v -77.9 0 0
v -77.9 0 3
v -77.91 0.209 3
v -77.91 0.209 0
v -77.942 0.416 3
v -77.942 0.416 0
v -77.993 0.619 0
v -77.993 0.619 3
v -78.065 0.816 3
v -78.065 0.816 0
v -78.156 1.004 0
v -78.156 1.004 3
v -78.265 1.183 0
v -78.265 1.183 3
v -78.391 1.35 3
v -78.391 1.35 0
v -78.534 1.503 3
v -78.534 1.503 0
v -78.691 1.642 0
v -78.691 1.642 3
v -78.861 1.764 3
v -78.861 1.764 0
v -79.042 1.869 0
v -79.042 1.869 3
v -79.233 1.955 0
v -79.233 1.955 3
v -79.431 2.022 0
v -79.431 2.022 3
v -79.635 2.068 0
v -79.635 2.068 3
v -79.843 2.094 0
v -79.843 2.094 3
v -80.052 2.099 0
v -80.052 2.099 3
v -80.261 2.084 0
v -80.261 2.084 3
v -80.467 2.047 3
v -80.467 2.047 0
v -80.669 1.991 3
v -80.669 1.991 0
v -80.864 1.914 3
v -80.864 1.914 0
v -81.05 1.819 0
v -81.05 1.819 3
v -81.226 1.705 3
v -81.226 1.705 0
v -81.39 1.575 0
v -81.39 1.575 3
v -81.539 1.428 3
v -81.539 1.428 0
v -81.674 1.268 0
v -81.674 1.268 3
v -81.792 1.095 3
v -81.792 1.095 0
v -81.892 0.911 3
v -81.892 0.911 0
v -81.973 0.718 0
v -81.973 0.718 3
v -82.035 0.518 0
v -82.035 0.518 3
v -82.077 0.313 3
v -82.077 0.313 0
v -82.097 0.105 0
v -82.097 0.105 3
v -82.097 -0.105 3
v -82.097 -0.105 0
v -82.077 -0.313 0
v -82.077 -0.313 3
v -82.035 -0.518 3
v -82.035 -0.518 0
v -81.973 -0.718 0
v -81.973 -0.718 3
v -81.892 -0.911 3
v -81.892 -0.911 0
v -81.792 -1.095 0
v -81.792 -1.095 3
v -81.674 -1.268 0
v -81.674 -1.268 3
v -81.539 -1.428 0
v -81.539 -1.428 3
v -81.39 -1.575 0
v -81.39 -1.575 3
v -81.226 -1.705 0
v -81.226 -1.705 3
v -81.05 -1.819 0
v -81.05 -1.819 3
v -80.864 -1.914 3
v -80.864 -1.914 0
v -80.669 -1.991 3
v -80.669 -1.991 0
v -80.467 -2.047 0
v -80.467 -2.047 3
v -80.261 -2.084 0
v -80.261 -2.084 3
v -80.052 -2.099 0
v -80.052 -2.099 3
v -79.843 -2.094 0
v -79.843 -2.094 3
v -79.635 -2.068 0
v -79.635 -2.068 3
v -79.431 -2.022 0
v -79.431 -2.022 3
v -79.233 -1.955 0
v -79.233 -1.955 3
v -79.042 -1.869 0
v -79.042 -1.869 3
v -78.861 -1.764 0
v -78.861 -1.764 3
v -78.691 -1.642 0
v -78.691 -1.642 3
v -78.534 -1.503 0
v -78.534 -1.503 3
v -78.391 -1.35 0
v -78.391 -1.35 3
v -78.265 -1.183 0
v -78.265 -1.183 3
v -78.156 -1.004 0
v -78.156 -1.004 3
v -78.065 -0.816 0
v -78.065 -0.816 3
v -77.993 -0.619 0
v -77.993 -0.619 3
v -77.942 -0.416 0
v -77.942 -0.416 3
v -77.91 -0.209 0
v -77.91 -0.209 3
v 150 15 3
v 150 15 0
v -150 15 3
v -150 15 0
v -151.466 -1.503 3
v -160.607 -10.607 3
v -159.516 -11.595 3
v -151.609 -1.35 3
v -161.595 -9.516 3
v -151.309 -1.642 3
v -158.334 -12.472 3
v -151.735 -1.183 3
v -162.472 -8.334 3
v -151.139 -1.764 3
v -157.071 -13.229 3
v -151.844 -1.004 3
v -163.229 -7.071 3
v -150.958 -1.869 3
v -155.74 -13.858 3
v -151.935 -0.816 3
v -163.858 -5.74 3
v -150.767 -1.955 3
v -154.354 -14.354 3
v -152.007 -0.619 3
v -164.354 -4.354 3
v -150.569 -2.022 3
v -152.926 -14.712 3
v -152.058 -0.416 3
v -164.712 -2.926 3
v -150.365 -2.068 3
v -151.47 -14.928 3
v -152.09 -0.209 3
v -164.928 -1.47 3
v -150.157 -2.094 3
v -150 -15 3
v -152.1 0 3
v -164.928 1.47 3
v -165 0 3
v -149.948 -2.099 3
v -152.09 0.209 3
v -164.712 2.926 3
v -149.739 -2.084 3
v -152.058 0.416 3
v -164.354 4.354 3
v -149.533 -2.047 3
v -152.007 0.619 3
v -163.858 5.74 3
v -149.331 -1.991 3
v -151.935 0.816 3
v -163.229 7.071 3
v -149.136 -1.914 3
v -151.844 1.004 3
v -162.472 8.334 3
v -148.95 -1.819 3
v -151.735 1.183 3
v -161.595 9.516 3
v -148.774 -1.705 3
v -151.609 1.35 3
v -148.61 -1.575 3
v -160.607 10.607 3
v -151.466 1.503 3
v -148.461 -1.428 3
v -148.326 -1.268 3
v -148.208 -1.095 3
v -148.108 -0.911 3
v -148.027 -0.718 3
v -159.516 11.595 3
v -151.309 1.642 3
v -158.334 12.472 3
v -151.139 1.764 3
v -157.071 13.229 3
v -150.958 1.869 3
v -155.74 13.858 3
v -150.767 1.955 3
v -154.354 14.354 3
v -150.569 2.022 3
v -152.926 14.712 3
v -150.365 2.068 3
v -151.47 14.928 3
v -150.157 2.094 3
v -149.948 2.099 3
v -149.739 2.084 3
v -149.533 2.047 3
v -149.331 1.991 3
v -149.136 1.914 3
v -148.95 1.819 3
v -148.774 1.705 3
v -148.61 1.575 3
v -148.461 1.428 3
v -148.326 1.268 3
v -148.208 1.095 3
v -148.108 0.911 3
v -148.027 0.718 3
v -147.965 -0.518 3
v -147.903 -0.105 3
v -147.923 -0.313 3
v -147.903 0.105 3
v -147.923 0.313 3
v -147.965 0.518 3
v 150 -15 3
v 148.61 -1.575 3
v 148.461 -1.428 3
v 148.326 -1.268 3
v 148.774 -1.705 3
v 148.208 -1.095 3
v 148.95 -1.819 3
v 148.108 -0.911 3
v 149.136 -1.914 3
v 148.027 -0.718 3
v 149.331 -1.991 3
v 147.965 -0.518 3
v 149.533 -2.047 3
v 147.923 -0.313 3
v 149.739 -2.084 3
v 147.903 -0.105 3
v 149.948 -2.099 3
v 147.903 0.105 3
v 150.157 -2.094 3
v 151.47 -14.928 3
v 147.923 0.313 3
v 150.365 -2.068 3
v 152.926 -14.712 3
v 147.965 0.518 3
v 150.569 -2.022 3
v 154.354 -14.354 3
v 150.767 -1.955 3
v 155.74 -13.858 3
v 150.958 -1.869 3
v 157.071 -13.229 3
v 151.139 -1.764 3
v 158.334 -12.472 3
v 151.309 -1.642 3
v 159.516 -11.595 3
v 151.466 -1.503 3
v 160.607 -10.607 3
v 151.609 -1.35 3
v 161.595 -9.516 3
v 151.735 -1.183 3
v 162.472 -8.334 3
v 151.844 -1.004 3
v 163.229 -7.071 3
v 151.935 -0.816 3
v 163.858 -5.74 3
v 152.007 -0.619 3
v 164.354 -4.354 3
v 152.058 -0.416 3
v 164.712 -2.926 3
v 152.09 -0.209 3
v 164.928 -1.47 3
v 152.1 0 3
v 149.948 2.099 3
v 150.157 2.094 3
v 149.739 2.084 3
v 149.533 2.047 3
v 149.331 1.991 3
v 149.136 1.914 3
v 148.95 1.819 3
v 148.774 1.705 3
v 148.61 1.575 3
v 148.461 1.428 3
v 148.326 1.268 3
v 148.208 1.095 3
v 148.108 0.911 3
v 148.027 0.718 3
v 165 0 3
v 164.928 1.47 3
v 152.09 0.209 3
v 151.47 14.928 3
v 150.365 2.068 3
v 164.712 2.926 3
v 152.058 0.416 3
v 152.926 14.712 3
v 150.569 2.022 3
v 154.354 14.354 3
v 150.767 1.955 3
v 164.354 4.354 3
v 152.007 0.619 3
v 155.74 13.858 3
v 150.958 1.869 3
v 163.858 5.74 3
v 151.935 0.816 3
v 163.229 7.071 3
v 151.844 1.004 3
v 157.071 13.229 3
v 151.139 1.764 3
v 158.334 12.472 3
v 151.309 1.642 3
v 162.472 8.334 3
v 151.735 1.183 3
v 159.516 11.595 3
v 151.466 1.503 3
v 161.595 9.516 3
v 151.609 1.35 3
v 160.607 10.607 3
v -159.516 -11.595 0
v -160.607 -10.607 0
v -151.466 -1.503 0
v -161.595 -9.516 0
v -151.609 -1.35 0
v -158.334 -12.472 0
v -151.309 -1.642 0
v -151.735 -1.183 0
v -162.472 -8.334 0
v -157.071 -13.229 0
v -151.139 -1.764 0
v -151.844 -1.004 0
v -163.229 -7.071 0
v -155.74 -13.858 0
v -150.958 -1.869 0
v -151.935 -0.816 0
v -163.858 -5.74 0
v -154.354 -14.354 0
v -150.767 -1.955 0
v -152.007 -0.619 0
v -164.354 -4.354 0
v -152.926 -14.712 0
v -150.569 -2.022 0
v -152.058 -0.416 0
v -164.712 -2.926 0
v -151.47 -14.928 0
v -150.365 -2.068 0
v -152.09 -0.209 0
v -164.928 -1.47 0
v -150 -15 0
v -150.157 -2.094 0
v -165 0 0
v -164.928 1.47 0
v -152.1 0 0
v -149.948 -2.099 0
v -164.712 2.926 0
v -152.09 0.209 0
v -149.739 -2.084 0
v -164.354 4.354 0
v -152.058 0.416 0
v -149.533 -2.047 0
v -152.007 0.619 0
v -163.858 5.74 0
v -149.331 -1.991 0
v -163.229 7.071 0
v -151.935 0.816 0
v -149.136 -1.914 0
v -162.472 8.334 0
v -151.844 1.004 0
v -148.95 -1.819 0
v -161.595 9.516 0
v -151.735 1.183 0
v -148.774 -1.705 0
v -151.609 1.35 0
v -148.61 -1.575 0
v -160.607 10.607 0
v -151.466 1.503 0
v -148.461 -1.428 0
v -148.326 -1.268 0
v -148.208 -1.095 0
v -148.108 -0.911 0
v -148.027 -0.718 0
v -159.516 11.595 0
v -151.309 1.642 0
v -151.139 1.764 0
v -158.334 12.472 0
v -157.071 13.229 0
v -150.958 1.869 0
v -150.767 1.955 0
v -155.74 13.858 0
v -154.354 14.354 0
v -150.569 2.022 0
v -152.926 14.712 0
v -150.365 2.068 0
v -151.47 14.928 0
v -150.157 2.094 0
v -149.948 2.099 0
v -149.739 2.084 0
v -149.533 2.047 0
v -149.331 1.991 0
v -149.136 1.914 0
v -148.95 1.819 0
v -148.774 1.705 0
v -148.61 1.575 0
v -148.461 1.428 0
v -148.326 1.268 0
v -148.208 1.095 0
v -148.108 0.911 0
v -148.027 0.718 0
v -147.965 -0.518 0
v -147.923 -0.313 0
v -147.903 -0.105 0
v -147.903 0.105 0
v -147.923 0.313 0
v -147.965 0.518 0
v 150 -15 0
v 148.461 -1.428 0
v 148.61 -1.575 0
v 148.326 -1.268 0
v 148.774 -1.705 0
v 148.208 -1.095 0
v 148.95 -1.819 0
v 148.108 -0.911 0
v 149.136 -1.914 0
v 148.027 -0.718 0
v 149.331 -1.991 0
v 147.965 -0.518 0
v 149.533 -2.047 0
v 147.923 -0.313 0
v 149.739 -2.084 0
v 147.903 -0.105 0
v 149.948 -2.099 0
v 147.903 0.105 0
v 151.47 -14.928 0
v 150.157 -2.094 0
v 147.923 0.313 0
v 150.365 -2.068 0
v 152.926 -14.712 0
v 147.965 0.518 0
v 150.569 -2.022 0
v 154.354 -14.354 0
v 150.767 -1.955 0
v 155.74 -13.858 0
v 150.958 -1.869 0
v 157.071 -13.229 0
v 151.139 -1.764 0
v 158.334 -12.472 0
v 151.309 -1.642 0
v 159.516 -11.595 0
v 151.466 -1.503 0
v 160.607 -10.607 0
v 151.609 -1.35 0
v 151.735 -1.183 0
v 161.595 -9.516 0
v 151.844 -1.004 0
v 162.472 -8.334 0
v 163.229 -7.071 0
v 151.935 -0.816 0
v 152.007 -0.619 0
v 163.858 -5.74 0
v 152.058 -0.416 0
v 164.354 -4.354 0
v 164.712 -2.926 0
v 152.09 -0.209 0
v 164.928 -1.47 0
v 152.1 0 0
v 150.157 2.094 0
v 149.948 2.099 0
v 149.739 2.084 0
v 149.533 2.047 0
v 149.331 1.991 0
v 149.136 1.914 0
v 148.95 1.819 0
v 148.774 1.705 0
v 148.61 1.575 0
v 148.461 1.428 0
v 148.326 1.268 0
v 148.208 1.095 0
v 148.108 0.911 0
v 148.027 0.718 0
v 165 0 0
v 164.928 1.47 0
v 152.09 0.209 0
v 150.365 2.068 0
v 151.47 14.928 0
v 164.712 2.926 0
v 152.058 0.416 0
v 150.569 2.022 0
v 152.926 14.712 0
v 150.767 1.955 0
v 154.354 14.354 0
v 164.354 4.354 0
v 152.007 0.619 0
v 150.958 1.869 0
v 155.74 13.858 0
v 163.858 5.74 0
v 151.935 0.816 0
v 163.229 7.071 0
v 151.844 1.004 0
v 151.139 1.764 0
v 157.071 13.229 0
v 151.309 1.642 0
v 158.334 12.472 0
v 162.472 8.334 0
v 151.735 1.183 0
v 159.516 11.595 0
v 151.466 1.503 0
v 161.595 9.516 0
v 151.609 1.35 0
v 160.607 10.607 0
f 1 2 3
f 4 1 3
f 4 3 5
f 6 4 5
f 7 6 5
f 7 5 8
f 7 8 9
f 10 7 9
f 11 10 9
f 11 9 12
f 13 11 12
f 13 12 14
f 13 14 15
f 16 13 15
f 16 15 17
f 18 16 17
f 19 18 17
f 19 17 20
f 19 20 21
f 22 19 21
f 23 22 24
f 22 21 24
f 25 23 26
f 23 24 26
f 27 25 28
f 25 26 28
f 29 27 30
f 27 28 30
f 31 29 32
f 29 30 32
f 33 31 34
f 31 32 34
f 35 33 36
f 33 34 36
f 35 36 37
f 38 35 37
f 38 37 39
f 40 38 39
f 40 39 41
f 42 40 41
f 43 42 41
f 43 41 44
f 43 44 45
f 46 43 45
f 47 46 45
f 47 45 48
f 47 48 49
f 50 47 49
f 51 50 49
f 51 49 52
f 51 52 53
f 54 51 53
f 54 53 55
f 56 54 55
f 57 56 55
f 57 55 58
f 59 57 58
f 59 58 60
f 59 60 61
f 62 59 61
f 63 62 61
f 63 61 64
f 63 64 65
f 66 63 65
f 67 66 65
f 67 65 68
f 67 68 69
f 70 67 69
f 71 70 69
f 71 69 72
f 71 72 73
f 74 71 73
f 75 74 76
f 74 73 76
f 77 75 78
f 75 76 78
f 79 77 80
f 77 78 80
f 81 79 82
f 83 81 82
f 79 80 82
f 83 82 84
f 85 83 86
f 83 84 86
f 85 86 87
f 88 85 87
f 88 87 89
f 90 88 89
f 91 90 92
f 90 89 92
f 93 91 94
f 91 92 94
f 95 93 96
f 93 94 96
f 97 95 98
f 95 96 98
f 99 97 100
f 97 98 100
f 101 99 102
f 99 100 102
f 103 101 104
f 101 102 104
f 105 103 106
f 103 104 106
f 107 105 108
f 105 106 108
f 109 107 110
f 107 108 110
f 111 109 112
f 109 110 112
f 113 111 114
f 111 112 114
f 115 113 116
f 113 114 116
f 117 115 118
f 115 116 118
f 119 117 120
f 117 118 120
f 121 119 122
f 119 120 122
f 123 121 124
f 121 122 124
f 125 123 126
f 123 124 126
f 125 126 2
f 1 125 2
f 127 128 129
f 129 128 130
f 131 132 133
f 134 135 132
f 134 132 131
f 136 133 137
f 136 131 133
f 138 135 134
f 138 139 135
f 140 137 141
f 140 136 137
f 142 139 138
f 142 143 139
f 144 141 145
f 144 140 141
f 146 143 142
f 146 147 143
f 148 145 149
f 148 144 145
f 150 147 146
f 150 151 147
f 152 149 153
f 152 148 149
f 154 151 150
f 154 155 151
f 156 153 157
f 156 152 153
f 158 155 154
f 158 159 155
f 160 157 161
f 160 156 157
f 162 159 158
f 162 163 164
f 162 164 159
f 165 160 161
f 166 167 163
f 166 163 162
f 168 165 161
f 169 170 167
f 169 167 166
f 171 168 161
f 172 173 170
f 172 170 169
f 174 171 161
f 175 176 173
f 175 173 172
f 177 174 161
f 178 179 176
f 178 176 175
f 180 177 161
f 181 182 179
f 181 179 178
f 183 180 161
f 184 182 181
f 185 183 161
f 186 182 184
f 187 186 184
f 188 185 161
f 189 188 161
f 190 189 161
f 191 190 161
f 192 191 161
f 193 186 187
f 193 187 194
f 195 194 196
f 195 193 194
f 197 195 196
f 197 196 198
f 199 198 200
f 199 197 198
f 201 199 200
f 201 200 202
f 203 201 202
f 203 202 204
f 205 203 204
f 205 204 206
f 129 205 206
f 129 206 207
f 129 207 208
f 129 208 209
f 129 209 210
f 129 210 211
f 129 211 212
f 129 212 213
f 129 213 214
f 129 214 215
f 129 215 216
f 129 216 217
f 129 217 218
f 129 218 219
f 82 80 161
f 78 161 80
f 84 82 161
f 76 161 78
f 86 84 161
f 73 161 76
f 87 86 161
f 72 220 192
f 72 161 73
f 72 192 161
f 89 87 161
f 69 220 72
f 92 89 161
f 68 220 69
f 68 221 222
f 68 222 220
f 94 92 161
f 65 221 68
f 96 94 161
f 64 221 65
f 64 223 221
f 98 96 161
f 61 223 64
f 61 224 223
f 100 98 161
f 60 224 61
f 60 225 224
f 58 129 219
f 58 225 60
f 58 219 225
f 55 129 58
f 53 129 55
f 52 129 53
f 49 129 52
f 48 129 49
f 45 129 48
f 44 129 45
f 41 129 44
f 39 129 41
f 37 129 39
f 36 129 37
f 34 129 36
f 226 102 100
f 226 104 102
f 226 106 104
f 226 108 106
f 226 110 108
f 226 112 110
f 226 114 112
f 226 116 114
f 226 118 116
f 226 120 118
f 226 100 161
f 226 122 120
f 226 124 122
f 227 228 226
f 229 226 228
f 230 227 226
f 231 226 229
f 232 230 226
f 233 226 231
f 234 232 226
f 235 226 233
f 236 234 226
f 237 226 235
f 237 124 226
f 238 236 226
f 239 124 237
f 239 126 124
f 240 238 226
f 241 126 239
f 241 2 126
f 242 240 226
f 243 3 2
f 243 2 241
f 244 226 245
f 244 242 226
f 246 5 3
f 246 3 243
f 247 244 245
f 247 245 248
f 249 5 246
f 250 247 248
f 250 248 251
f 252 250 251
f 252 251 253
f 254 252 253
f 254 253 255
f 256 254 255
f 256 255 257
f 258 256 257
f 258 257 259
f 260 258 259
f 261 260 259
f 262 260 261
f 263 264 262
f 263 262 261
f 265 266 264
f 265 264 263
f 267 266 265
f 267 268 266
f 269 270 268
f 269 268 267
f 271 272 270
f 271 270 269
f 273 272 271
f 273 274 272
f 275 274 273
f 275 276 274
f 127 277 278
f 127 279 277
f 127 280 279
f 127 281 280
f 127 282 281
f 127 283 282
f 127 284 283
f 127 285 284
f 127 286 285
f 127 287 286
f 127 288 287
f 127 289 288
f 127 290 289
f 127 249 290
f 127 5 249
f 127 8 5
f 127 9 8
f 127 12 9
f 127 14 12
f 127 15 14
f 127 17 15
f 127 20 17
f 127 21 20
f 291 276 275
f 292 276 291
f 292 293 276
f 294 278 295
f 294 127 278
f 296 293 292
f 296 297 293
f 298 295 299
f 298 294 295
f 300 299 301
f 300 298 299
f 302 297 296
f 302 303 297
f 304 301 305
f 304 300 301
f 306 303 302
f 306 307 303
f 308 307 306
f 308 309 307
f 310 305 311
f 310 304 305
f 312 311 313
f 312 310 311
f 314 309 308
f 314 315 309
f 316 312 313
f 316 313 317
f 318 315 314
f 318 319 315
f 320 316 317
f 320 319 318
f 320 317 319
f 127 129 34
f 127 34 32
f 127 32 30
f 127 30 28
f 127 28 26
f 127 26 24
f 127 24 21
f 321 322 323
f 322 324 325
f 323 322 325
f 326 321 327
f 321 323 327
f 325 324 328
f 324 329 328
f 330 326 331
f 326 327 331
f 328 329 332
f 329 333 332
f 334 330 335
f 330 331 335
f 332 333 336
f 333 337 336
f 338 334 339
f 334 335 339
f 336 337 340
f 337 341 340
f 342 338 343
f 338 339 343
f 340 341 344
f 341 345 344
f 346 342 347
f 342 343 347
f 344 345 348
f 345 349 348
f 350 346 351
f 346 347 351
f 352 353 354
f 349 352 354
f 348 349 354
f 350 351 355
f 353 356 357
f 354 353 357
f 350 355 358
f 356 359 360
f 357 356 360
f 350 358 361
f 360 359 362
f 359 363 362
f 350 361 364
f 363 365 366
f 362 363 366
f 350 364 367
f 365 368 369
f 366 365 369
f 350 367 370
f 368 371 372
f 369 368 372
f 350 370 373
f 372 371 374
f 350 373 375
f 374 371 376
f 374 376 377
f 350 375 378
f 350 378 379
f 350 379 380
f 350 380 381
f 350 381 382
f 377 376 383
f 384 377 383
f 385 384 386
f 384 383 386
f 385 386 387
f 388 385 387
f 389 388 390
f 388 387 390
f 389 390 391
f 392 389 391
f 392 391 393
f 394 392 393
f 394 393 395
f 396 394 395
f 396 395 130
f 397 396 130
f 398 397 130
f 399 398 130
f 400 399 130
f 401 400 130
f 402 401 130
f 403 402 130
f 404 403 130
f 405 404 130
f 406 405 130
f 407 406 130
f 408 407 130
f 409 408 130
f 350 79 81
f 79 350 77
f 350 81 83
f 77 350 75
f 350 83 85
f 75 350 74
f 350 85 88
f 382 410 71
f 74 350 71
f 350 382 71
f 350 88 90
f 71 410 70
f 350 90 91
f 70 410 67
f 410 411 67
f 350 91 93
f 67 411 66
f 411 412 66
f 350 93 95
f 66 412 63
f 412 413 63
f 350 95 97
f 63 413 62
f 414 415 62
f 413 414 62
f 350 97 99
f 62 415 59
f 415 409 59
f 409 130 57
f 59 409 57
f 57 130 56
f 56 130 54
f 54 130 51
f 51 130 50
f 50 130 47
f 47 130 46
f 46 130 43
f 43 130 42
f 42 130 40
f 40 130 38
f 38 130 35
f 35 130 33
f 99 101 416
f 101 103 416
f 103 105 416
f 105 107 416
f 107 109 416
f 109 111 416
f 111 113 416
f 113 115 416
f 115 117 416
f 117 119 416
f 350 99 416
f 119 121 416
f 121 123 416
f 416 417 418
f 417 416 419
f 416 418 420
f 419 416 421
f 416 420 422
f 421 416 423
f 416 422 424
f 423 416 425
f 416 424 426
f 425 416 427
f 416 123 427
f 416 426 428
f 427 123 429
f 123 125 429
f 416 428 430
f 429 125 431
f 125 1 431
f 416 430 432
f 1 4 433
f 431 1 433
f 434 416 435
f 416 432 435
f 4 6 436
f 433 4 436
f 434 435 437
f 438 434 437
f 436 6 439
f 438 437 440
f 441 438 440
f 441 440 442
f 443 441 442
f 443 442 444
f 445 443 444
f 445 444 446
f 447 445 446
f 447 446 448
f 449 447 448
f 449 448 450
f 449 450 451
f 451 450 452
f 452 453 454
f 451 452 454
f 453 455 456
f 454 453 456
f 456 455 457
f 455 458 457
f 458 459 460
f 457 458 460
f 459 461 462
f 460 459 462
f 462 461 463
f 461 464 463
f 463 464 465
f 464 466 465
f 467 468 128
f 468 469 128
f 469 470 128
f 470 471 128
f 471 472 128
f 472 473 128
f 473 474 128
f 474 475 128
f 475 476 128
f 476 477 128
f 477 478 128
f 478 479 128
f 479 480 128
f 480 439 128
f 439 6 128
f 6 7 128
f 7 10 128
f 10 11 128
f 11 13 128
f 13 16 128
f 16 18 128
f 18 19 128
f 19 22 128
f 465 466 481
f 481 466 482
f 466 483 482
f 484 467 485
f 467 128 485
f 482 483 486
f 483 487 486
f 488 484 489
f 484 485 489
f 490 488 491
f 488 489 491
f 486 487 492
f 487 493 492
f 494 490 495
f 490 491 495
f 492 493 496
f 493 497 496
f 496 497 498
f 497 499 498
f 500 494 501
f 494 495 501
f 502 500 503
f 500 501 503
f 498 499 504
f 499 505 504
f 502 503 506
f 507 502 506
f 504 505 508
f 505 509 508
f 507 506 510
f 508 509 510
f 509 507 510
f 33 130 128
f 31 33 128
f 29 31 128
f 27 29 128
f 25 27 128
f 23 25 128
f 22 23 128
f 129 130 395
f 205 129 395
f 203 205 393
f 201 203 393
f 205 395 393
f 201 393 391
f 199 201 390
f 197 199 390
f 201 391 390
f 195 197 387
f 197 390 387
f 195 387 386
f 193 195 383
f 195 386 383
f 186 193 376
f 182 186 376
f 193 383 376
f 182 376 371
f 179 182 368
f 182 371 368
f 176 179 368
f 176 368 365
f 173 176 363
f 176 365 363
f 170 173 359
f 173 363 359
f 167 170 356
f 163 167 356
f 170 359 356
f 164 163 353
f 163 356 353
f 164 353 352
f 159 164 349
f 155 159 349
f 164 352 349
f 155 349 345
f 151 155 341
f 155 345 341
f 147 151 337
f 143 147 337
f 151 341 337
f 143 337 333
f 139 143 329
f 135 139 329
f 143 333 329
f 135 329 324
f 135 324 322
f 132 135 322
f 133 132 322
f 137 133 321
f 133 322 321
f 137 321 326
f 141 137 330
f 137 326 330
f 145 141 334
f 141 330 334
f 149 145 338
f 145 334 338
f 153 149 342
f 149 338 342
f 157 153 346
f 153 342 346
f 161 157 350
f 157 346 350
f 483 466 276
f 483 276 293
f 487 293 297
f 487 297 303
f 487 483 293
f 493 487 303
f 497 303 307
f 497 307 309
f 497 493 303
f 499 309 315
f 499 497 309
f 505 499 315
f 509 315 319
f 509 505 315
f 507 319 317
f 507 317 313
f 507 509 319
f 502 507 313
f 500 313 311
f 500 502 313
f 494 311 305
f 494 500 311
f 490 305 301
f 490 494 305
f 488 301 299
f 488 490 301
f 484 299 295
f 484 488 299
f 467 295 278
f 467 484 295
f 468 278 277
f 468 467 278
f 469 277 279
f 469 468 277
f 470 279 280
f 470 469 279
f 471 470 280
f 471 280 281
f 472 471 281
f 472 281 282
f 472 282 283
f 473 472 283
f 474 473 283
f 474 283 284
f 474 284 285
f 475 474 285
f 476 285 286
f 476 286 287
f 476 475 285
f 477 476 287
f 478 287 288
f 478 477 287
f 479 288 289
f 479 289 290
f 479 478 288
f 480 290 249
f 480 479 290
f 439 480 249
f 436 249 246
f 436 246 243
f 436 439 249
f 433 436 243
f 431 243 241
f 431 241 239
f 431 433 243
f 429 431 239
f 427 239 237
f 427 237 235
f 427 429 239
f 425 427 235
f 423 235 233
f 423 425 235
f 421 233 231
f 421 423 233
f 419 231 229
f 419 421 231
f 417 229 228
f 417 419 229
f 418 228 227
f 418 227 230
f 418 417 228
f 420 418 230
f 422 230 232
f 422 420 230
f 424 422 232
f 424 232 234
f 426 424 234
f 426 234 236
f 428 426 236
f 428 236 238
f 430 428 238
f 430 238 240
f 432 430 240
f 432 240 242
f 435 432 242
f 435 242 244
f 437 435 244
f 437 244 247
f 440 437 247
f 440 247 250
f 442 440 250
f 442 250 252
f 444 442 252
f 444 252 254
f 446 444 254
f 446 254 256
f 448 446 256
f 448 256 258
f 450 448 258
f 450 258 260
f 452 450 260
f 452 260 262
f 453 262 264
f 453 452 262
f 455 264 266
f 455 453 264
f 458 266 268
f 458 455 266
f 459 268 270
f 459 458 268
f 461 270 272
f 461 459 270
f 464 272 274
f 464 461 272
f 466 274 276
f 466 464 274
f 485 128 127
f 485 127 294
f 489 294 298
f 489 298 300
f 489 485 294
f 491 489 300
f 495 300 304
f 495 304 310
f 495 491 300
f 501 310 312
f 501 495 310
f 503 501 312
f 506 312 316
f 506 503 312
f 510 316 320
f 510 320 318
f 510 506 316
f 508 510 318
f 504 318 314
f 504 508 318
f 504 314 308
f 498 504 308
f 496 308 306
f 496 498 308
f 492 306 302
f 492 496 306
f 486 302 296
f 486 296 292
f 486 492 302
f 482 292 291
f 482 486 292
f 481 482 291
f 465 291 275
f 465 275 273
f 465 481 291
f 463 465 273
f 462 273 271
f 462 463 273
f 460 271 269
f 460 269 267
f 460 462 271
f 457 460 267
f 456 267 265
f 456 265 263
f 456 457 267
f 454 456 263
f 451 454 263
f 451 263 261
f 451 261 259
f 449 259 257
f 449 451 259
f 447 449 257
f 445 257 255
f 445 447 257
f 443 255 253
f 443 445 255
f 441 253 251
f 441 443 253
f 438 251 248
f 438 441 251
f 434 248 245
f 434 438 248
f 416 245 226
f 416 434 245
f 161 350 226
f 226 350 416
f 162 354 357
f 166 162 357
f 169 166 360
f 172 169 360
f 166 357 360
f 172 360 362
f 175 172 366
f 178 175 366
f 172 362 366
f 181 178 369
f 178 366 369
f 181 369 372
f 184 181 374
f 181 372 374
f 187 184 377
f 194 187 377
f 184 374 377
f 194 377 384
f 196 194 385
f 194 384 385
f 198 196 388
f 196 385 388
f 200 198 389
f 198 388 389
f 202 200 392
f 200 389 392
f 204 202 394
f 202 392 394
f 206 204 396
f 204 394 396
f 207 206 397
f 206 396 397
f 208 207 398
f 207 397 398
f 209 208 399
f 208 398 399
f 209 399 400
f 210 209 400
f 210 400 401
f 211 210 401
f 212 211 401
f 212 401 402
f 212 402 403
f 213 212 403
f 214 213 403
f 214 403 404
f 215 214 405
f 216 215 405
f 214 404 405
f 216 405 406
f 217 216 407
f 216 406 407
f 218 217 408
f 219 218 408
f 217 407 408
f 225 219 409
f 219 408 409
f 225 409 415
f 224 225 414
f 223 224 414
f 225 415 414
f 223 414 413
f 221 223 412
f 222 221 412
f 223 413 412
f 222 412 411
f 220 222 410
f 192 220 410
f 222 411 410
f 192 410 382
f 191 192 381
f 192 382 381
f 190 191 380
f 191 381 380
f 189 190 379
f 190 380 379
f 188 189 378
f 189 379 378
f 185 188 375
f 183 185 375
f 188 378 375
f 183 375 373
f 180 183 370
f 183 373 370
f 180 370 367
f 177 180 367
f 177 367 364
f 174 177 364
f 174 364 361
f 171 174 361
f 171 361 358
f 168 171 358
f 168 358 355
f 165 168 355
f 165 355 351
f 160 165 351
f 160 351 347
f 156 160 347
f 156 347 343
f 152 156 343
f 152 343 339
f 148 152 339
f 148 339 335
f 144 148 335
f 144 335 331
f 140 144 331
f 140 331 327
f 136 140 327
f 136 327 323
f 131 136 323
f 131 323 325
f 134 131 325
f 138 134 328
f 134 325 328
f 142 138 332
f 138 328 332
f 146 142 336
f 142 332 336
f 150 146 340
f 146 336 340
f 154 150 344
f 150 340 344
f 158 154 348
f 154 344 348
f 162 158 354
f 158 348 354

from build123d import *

# Parameters (mm, degrees)
ESQUISSE1_R             = 2.1
BOSS_EXTRU_1_DEPTH      = 3
ESQUISSE2_R             = 2.1
ENL_V_MAT_EXTRU_1_DEPTH = 166.707573756


with BuildPart() as part:
    # Esquisse1 → Boss.-Extru.1 (new body)
    with BuildSketch(Plane.XY):
        with BuildLine():
            Line((0, 15), (150, 15))
            ThreePointArc((150, 15), (165, 0), (150, -15))
            Line((150, -15), (0, -15))
            Line((0, -15), (0, 15))
        make_face()
        with Locations((150, 0)):
            Circle(ESQUISSE1_R, mode=Mode.SUBTRACT)
    extrude(amount=BOSS_EXTRU_1_DEPTH)

    # Symétrie1: part across plane


with BuildPart() as part_1:
    add(part.part)
    add(part.part.mirror(Plane(origin=(0, 15, 3), x_dir=(0, 0, 1), z_dir=(1, 0, 0))))

    # Esquisse2 → Enlèv. mat.-Extru.1 (cut, through all)
    with BuildSketch(Plane.XY.offset(3)):
        with Locations((-80, 0)):
            Circle(ESQUISSE2_R)
    extrude(amount=-ENL_V_MAT_EXTRU_1_DEPTH, mode=Mode.SUBTRACT)


solid = part_1.part
